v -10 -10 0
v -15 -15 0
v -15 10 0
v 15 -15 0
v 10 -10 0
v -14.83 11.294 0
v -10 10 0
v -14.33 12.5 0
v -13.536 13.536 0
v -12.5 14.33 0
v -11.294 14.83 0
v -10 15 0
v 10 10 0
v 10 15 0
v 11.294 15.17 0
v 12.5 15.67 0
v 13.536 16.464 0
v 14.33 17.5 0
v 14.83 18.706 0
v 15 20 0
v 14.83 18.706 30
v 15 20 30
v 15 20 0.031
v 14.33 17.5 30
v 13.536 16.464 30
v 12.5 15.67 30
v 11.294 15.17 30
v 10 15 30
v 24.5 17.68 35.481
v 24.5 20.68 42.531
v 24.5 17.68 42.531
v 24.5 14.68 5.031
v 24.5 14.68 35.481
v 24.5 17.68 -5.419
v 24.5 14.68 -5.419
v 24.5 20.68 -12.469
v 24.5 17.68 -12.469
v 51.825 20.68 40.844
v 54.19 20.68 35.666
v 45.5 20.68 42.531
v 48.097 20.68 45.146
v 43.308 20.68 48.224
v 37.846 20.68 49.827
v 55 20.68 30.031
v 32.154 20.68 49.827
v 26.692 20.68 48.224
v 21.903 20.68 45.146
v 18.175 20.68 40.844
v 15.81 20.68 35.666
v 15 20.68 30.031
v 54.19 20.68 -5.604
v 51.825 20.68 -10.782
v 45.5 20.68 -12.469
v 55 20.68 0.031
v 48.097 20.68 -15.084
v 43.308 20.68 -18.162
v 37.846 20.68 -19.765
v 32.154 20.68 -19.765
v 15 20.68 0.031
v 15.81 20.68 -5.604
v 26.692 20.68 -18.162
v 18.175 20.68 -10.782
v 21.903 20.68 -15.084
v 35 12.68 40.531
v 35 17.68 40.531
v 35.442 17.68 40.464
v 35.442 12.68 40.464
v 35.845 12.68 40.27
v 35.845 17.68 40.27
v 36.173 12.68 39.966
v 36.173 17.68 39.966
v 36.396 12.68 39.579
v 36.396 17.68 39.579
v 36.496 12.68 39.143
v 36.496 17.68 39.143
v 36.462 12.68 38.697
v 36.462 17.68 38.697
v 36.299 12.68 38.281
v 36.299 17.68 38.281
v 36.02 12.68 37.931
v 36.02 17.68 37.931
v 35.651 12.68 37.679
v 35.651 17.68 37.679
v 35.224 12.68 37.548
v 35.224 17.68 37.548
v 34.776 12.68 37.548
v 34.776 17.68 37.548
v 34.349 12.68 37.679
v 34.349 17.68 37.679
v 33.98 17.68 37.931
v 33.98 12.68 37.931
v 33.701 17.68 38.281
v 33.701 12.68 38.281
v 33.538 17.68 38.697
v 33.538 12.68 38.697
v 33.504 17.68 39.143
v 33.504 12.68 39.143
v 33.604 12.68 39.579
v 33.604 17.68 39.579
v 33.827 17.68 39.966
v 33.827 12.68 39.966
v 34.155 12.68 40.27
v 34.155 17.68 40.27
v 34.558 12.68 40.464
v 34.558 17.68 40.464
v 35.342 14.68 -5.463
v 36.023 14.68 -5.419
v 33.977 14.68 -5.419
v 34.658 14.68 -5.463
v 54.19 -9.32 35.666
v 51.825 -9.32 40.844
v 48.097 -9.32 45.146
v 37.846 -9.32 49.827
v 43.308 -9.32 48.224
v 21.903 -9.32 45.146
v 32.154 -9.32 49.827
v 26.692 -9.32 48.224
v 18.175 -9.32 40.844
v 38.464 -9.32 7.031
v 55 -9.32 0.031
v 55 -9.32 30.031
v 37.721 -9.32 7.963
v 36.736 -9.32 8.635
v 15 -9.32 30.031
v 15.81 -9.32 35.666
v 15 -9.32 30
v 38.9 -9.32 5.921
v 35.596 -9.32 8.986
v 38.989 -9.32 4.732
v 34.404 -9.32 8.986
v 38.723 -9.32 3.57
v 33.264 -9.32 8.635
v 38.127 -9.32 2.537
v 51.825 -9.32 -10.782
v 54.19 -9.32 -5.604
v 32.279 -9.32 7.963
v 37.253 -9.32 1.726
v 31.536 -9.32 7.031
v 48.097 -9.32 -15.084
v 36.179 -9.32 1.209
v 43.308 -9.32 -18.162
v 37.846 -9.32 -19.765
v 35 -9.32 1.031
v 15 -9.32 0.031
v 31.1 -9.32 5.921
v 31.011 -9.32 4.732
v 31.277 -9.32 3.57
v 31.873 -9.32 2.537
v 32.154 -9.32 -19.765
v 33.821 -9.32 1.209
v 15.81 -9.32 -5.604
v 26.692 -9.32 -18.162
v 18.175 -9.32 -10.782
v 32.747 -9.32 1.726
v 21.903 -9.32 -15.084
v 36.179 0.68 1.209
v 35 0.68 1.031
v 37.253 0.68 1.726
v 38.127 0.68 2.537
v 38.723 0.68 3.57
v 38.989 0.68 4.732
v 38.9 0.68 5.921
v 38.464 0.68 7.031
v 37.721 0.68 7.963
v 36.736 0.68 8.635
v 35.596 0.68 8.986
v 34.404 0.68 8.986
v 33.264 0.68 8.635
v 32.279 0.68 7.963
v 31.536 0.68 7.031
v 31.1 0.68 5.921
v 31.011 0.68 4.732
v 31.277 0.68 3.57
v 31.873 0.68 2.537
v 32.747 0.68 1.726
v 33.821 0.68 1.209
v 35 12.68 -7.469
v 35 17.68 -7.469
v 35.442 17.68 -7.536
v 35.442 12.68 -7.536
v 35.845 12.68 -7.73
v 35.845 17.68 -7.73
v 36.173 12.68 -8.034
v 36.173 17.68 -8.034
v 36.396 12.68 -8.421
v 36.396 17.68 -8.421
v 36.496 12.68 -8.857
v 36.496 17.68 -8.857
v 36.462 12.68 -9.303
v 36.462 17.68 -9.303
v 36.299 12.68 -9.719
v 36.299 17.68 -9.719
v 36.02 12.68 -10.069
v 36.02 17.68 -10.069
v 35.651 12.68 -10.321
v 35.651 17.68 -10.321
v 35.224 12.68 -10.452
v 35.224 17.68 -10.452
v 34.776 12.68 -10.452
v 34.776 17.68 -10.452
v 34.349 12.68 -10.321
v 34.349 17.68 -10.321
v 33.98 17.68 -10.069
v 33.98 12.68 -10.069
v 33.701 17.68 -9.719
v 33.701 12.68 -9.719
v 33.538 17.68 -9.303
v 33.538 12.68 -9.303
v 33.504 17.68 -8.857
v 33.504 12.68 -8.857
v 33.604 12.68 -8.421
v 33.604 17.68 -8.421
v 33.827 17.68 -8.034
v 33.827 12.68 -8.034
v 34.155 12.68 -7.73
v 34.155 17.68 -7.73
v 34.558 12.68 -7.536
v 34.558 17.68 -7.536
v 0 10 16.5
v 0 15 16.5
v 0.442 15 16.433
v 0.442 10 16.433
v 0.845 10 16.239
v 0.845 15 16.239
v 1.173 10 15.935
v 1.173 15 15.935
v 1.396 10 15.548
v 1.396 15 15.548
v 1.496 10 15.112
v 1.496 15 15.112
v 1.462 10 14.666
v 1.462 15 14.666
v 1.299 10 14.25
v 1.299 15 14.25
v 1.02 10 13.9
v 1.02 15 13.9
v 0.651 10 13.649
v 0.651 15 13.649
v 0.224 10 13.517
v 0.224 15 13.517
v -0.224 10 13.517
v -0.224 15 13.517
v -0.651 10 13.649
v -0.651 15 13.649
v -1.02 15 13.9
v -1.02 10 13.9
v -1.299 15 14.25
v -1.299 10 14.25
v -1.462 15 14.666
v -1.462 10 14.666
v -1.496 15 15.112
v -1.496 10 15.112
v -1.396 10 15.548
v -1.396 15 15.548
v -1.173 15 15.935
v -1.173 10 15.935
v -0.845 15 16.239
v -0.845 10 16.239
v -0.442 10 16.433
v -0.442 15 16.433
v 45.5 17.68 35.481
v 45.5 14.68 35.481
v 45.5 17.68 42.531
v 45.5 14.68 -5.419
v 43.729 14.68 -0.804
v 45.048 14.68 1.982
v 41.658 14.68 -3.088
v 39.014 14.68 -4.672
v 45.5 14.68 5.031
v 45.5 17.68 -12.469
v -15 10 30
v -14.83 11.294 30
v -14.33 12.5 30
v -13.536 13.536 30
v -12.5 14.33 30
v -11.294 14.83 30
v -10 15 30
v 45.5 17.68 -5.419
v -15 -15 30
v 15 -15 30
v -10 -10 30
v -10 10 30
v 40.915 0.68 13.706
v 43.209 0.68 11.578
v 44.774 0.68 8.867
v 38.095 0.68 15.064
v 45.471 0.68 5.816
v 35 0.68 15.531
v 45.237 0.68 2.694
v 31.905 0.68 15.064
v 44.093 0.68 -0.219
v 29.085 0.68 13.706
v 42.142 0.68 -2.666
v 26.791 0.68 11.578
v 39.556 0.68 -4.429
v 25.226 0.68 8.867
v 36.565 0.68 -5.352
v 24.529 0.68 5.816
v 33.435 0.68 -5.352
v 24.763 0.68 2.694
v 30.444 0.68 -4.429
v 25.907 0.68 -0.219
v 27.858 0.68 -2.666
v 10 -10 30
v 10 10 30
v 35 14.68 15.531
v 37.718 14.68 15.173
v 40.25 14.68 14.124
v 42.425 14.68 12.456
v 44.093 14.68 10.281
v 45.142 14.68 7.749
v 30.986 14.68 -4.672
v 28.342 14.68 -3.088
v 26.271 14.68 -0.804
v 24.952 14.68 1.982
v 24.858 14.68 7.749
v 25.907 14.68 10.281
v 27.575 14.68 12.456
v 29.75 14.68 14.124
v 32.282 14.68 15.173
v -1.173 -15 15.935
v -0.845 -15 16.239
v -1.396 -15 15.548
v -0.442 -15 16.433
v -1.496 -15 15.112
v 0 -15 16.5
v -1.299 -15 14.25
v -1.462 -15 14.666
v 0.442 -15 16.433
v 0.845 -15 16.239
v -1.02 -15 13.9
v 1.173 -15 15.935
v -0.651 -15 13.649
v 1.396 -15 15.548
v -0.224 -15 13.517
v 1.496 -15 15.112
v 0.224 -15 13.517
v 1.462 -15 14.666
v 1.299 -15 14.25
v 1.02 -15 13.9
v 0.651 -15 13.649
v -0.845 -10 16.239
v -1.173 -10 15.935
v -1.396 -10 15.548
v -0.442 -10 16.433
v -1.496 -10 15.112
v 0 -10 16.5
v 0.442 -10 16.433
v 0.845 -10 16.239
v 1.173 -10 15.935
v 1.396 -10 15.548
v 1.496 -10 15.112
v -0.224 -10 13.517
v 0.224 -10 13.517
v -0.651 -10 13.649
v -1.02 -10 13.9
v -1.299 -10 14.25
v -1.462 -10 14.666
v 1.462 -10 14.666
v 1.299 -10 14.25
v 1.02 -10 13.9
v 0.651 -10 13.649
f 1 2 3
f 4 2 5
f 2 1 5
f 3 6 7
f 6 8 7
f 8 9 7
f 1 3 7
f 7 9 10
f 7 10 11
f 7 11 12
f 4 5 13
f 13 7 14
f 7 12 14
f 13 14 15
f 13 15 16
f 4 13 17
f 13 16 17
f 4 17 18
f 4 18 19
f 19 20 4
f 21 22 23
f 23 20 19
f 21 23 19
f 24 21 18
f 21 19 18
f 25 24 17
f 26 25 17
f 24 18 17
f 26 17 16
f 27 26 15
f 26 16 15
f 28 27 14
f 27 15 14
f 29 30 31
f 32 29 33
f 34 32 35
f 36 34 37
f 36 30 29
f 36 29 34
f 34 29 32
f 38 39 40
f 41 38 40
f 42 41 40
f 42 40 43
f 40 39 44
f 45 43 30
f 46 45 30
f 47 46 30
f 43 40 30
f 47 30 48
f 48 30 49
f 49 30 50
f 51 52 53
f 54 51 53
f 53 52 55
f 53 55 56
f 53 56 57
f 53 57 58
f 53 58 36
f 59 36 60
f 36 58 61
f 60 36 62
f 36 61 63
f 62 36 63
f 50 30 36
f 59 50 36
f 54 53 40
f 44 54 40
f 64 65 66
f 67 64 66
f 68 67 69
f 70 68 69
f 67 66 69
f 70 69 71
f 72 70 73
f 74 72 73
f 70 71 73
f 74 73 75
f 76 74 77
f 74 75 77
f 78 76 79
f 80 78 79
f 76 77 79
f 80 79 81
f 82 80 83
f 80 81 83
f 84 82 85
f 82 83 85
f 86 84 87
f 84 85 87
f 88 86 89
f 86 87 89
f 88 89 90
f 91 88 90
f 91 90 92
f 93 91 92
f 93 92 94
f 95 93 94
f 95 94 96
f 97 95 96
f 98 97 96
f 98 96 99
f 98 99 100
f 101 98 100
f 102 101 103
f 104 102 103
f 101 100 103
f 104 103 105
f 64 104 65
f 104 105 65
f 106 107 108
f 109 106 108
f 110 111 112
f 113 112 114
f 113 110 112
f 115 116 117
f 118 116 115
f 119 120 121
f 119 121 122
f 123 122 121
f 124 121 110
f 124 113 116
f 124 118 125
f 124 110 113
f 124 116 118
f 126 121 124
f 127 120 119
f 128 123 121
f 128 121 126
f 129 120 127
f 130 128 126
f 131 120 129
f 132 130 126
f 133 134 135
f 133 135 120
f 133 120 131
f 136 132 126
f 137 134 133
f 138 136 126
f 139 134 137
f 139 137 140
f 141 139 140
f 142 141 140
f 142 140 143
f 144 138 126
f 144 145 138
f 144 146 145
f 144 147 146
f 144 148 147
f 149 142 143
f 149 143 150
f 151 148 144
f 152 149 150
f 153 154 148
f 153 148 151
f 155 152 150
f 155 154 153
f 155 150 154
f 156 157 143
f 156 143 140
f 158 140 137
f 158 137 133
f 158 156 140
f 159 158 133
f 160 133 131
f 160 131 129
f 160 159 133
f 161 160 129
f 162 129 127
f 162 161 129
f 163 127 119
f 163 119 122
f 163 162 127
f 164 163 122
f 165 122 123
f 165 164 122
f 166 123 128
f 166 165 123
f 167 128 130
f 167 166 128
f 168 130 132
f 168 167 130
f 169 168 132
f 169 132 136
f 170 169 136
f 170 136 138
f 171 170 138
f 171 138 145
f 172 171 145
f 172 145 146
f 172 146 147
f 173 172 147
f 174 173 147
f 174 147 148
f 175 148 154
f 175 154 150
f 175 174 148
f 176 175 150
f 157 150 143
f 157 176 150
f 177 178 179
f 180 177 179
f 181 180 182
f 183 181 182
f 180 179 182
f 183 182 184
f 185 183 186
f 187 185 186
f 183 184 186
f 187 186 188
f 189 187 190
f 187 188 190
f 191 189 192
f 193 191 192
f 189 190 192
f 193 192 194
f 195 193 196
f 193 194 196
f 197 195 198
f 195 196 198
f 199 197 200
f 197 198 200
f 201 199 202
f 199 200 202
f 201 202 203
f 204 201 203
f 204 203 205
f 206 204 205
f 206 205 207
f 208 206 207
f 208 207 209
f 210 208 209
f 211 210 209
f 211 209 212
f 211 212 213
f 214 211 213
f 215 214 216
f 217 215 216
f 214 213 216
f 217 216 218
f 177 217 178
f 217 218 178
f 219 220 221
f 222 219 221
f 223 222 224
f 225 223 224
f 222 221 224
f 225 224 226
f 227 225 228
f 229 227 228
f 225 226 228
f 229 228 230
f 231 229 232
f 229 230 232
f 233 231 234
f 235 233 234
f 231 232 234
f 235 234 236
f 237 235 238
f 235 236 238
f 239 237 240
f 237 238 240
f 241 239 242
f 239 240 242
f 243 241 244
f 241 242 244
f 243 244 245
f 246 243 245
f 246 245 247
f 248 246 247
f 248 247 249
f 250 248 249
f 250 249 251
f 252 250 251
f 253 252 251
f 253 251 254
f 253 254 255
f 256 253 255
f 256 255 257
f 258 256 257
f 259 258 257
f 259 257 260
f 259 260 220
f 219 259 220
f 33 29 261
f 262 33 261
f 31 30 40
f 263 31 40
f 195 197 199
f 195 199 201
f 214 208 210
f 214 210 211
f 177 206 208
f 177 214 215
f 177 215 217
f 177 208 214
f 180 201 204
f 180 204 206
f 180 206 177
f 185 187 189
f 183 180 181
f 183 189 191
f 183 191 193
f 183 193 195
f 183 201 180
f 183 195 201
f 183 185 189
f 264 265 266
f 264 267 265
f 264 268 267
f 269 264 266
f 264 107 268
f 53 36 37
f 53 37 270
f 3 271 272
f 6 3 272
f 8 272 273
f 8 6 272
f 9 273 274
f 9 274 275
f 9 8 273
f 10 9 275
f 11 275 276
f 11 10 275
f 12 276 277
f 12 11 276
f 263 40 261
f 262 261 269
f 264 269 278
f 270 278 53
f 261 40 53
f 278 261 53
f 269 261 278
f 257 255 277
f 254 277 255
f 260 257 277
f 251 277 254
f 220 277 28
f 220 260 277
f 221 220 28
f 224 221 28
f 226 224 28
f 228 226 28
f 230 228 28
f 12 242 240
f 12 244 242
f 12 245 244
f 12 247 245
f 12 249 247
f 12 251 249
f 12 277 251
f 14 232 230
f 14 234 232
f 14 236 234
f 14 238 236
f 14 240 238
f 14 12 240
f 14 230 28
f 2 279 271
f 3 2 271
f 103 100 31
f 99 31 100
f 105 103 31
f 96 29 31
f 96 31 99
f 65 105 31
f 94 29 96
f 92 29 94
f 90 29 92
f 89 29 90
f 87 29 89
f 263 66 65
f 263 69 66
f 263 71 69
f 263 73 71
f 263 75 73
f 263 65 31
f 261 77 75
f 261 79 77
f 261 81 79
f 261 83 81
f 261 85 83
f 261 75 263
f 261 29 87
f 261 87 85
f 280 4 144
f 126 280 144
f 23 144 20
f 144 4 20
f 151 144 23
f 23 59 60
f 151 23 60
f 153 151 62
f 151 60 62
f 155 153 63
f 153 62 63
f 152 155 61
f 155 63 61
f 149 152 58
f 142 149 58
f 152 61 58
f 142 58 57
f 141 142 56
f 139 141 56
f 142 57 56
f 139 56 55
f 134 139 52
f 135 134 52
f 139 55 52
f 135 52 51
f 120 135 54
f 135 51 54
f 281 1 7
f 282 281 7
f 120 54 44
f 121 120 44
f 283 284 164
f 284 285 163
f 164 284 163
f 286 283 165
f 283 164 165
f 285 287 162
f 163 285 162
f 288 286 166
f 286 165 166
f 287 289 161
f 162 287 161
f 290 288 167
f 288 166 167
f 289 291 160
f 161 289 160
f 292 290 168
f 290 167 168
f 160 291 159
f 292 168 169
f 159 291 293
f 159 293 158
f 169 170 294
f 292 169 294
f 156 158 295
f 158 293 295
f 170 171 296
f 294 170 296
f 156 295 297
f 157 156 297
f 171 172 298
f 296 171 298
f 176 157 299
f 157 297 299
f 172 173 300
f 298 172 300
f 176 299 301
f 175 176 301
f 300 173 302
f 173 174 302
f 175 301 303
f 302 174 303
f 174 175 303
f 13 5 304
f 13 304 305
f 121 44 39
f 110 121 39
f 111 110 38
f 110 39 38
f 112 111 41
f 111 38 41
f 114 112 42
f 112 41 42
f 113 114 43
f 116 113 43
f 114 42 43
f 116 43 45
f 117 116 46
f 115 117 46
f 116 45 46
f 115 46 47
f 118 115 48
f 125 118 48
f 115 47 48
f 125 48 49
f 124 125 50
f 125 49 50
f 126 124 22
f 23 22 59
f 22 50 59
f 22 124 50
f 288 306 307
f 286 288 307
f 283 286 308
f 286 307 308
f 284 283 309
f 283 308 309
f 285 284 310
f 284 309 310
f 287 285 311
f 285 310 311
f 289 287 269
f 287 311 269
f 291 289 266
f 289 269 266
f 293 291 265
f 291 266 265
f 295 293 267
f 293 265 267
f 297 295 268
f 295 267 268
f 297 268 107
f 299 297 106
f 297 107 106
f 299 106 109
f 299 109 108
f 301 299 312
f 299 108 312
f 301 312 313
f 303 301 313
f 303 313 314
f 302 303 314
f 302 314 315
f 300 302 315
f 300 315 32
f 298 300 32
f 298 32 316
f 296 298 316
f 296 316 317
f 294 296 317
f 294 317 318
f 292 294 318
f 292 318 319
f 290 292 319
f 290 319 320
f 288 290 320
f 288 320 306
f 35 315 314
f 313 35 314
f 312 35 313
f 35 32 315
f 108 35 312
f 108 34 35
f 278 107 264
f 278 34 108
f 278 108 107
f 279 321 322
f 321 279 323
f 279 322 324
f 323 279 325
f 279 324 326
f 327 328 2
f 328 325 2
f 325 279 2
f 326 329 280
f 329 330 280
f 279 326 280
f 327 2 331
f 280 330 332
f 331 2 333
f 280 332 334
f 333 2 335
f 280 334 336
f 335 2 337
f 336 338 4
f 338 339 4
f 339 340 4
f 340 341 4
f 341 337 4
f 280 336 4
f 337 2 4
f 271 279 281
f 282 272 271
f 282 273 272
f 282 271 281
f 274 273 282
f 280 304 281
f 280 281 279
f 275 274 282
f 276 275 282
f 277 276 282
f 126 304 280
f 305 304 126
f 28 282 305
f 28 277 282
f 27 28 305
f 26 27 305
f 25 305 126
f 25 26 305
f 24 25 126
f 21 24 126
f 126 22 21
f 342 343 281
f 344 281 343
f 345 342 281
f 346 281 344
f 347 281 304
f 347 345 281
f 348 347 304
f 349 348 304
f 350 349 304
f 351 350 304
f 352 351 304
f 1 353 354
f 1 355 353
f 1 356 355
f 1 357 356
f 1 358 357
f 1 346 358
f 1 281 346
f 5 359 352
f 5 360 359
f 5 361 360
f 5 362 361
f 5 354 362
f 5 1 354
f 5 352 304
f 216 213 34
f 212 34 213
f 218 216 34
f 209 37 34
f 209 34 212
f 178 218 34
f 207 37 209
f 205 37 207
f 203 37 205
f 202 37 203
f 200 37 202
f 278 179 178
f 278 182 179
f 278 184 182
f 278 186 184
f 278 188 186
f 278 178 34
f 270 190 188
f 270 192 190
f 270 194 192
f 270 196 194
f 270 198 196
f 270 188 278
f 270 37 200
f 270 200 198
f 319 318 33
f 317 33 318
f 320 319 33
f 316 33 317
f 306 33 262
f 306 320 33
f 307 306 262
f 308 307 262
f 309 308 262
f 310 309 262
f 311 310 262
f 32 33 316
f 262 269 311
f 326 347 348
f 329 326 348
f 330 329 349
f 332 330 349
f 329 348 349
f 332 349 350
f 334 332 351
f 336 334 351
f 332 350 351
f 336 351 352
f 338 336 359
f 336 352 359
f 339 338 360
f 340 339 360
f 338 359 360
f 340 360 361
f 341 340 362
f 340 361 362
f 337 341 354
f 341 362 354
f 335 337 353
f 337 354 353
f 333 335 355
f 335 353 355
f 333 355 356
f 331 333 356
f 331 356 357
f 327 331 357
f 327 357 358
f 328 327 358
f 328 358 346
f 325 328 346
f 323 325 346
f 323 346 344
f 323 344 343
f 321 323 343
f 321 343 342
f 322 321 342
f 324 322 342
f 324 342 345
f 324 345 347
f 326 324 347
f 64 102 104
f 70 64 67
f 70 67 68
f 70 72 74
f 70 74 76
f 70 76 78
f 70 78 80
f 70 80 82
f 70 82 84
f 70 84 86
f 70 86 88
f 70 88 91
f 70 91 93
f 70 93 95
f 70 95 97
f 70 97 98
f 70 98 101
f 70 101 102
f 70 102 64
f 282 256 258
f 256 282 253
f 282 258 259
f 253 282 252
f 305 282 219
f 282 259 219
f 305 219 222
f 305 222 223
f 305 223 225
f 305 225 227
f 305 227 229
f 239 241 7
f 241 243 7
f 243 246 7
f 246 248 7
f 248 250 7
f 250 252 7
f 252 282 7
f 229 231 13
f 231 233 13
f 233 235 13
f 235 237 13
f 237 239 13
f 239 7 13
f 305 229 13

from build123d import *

# Parameters (mm, degrees)
SKETCH1_W           = 30
SKETCH1_H           = 30
SKETCH1_W_2         = 20
SKETCH1_H_2         = 20
BOSS_EXTRUDE2_DEPTH = 30
BOSS_EXTRUDE3_DEPTH = 30
SKETCH6_W           = 21
SKETCH6_H           = 55
CUT_EXTRUDE1_DEPTH  = 3
SKETCH7_R           = 1.5
CUT_EXTRUDE2_DEPTH  = 5
SKETCH8_W           = 21
SKETCH8_H           = 40.9
CUT_EXTRUDE3_DEPTH  = 3
SKETCH9_R           = 10.5
CUT_EXTRUDE4_DEPTH  = 81.056214629
BOSS_EXTRUDE4_START = -10
SKETCH10_R          = 10.5
SKETCH10_R_2        = 4
BOSS_EXTRUDE4_DEPTH = 10
FILLET1_DEPTH       = 30
FILLET1_2_DEPTH     = 30
SKETCH11_R          = 1.5
CUT_EXTRUDE6_DEPTH  = 81.175402093


with BuildPart() as part:
    # Sketch1 → Boss-Extrude2 (new body)
    with BuildSketch(Plane.XY):
        Rectangle(SKETCH1_W, SKETCH1_H)
        Rectangle(SKETCH1_W_2, SKETCH1_H_2, mode=Mode.SUBTRACT)
    extrude(amount=BOSS_EXTRUDE2_DEPTH)

    # Sketch5 → Boss-Extrude3 (add)
    with BuildSketch(Plane(origin=(0, 20.68, 0), x_dir=(1, 0, 0), z_dir=(0, 1, 0))):
        with BuildLine():
            Line((15, -30.030941434), (15, -0.030941434))
            ThreePointArc((15, -0.030941434), (35, 19.969058566), (55, -0.030941434))
            Line((55, -0.030941434), (55, -30.030941434))
            ThreePointArc((55, -30.030941434), (35, -50.030941434), (15, -30.030941434))
        make_face()
    extrude(amount=-BOSS_EXTRUDE3_DEPTH)

    # Sketch6 → Cut-Extrude1 (cut)
    with BuildSketch(Plane(origin=(0, 20.68, 0), x_dir=(1, 0, 0), z_dir=(0, 1, 0))):
        with Locations((35, -15.030941434)):
            Rectangle(SKETCH6_W, SKETCH6_H)
    extrude(amount=-CUT_EXTRUDE1_DEPTH, mode=Mode.SUBTRACT)

    # Sketch7 → Cut-Extrude2 (cut)
    with BuildSketch(Plane(origin=(0, 17.68, 0), x_dir=(1, 0, 0), z_dir=(0, 1, 0))):
        with Locations(Location((35, -39.030941434, 0), (0, 0, 270))):
            Circle(SKETCH7_R)
        with Locations(Location((35, 8.969058566, 0), (0, 0, 270))):
            Circle(SKETCH7_R)
    extrude(amount=-CUT_EXTRUDE2_DEPTH, mode=Mode.SUBTRACT)

    # Sketch8 → Cut-Extrude3 (cut)
    with BuildSketch(Plane(origin=(0, 17.68, 0), x_dir=(1, 0, 0), z_dir=(0, 1, 0))):
        with Locations((35, -15.030941434)):
            Rectangle(SKETCH8_W, SKETCH8_H)
    extrude(amount=-CUT_EXTRUDE3_DEPTH, mode=Mode.SUBTRACT)

    # Sketch9 → Cut-Extrude4 (cut, through all)
    with BuildSketch(Plane(origin=(0, 14.68, 0), x_dir=(1, 0, 0), z_dir=(0, 1, 0))):
        with Locations(Location((35, -5.030941434, 0), (0, 0, 270))):
            Circle(SKETCH9_R)
    extrude(amount=-CUT_EXTRUDE4_DEPTH, mode=Mode.SUBTRACT)

    # Sketch10 → Boss-Extrude4 (add)
    with BuildSketch(Plane.XZ.offset(9.32).offset(BOSS_EXTRUDE4_START)):
        with Locations(Location((35, 5.030941434, 0), (0, 0, 180))):
            Circle(SKETCH10_R)
        with Locations(Location((35, 5.030941434, 0), (0, 0, 270))):
            Circle(SKETCH10_R_2, mode=Mode.SUBTRACT)
    extrude(amount=BOSS_EXTRUDE4_DEPTH)

    # Fillet1: read off the stored shape, not the designer's step
    # Fillet1 outline → Fillet1 (cut)
    with BuildSketch(Plane.XY):
        with BuildLine():
            ThreePointArc((-15, 10), (-13.535533906, 13.535533906), (-10, 15))
            Line((-10, 15), (-15, 15))
            Line((-15, 15), (-15, 10))
        make_face()
    extrude(amount=FILLET1_DEPTH, mode=Mode.SUBTRACT)

    # Fillet1 2 outline → Fillet1 2 (add)
    with BuildSketch(Plane.XY):
        with BuildLine():
            ThreePointArc((15, 20), (13.535533906, 16.464466094), (10, 15))
            Line((10, 15), (15, 15))
            Line((15, 15), (15, 20))
        make_face()
    extrude(amount=FILLET1_2_DEPTH)

    # Sketch11 → Cut-Extrude6 (cut, through all)
    with BuildSketch(Plane(origin=(0, 15, 0), x_dir=(1, 0, 0), z_dir=(0, 1, 0))):
        with Locations(Location((0, -15, 0), (0, 0, 270))):
            Circle(SKETCH11_R)
    extrude(amount=-CUT_EXTRUDE6_DEPTH, mode=Mode.SUBTRACT)


solid = part.part
